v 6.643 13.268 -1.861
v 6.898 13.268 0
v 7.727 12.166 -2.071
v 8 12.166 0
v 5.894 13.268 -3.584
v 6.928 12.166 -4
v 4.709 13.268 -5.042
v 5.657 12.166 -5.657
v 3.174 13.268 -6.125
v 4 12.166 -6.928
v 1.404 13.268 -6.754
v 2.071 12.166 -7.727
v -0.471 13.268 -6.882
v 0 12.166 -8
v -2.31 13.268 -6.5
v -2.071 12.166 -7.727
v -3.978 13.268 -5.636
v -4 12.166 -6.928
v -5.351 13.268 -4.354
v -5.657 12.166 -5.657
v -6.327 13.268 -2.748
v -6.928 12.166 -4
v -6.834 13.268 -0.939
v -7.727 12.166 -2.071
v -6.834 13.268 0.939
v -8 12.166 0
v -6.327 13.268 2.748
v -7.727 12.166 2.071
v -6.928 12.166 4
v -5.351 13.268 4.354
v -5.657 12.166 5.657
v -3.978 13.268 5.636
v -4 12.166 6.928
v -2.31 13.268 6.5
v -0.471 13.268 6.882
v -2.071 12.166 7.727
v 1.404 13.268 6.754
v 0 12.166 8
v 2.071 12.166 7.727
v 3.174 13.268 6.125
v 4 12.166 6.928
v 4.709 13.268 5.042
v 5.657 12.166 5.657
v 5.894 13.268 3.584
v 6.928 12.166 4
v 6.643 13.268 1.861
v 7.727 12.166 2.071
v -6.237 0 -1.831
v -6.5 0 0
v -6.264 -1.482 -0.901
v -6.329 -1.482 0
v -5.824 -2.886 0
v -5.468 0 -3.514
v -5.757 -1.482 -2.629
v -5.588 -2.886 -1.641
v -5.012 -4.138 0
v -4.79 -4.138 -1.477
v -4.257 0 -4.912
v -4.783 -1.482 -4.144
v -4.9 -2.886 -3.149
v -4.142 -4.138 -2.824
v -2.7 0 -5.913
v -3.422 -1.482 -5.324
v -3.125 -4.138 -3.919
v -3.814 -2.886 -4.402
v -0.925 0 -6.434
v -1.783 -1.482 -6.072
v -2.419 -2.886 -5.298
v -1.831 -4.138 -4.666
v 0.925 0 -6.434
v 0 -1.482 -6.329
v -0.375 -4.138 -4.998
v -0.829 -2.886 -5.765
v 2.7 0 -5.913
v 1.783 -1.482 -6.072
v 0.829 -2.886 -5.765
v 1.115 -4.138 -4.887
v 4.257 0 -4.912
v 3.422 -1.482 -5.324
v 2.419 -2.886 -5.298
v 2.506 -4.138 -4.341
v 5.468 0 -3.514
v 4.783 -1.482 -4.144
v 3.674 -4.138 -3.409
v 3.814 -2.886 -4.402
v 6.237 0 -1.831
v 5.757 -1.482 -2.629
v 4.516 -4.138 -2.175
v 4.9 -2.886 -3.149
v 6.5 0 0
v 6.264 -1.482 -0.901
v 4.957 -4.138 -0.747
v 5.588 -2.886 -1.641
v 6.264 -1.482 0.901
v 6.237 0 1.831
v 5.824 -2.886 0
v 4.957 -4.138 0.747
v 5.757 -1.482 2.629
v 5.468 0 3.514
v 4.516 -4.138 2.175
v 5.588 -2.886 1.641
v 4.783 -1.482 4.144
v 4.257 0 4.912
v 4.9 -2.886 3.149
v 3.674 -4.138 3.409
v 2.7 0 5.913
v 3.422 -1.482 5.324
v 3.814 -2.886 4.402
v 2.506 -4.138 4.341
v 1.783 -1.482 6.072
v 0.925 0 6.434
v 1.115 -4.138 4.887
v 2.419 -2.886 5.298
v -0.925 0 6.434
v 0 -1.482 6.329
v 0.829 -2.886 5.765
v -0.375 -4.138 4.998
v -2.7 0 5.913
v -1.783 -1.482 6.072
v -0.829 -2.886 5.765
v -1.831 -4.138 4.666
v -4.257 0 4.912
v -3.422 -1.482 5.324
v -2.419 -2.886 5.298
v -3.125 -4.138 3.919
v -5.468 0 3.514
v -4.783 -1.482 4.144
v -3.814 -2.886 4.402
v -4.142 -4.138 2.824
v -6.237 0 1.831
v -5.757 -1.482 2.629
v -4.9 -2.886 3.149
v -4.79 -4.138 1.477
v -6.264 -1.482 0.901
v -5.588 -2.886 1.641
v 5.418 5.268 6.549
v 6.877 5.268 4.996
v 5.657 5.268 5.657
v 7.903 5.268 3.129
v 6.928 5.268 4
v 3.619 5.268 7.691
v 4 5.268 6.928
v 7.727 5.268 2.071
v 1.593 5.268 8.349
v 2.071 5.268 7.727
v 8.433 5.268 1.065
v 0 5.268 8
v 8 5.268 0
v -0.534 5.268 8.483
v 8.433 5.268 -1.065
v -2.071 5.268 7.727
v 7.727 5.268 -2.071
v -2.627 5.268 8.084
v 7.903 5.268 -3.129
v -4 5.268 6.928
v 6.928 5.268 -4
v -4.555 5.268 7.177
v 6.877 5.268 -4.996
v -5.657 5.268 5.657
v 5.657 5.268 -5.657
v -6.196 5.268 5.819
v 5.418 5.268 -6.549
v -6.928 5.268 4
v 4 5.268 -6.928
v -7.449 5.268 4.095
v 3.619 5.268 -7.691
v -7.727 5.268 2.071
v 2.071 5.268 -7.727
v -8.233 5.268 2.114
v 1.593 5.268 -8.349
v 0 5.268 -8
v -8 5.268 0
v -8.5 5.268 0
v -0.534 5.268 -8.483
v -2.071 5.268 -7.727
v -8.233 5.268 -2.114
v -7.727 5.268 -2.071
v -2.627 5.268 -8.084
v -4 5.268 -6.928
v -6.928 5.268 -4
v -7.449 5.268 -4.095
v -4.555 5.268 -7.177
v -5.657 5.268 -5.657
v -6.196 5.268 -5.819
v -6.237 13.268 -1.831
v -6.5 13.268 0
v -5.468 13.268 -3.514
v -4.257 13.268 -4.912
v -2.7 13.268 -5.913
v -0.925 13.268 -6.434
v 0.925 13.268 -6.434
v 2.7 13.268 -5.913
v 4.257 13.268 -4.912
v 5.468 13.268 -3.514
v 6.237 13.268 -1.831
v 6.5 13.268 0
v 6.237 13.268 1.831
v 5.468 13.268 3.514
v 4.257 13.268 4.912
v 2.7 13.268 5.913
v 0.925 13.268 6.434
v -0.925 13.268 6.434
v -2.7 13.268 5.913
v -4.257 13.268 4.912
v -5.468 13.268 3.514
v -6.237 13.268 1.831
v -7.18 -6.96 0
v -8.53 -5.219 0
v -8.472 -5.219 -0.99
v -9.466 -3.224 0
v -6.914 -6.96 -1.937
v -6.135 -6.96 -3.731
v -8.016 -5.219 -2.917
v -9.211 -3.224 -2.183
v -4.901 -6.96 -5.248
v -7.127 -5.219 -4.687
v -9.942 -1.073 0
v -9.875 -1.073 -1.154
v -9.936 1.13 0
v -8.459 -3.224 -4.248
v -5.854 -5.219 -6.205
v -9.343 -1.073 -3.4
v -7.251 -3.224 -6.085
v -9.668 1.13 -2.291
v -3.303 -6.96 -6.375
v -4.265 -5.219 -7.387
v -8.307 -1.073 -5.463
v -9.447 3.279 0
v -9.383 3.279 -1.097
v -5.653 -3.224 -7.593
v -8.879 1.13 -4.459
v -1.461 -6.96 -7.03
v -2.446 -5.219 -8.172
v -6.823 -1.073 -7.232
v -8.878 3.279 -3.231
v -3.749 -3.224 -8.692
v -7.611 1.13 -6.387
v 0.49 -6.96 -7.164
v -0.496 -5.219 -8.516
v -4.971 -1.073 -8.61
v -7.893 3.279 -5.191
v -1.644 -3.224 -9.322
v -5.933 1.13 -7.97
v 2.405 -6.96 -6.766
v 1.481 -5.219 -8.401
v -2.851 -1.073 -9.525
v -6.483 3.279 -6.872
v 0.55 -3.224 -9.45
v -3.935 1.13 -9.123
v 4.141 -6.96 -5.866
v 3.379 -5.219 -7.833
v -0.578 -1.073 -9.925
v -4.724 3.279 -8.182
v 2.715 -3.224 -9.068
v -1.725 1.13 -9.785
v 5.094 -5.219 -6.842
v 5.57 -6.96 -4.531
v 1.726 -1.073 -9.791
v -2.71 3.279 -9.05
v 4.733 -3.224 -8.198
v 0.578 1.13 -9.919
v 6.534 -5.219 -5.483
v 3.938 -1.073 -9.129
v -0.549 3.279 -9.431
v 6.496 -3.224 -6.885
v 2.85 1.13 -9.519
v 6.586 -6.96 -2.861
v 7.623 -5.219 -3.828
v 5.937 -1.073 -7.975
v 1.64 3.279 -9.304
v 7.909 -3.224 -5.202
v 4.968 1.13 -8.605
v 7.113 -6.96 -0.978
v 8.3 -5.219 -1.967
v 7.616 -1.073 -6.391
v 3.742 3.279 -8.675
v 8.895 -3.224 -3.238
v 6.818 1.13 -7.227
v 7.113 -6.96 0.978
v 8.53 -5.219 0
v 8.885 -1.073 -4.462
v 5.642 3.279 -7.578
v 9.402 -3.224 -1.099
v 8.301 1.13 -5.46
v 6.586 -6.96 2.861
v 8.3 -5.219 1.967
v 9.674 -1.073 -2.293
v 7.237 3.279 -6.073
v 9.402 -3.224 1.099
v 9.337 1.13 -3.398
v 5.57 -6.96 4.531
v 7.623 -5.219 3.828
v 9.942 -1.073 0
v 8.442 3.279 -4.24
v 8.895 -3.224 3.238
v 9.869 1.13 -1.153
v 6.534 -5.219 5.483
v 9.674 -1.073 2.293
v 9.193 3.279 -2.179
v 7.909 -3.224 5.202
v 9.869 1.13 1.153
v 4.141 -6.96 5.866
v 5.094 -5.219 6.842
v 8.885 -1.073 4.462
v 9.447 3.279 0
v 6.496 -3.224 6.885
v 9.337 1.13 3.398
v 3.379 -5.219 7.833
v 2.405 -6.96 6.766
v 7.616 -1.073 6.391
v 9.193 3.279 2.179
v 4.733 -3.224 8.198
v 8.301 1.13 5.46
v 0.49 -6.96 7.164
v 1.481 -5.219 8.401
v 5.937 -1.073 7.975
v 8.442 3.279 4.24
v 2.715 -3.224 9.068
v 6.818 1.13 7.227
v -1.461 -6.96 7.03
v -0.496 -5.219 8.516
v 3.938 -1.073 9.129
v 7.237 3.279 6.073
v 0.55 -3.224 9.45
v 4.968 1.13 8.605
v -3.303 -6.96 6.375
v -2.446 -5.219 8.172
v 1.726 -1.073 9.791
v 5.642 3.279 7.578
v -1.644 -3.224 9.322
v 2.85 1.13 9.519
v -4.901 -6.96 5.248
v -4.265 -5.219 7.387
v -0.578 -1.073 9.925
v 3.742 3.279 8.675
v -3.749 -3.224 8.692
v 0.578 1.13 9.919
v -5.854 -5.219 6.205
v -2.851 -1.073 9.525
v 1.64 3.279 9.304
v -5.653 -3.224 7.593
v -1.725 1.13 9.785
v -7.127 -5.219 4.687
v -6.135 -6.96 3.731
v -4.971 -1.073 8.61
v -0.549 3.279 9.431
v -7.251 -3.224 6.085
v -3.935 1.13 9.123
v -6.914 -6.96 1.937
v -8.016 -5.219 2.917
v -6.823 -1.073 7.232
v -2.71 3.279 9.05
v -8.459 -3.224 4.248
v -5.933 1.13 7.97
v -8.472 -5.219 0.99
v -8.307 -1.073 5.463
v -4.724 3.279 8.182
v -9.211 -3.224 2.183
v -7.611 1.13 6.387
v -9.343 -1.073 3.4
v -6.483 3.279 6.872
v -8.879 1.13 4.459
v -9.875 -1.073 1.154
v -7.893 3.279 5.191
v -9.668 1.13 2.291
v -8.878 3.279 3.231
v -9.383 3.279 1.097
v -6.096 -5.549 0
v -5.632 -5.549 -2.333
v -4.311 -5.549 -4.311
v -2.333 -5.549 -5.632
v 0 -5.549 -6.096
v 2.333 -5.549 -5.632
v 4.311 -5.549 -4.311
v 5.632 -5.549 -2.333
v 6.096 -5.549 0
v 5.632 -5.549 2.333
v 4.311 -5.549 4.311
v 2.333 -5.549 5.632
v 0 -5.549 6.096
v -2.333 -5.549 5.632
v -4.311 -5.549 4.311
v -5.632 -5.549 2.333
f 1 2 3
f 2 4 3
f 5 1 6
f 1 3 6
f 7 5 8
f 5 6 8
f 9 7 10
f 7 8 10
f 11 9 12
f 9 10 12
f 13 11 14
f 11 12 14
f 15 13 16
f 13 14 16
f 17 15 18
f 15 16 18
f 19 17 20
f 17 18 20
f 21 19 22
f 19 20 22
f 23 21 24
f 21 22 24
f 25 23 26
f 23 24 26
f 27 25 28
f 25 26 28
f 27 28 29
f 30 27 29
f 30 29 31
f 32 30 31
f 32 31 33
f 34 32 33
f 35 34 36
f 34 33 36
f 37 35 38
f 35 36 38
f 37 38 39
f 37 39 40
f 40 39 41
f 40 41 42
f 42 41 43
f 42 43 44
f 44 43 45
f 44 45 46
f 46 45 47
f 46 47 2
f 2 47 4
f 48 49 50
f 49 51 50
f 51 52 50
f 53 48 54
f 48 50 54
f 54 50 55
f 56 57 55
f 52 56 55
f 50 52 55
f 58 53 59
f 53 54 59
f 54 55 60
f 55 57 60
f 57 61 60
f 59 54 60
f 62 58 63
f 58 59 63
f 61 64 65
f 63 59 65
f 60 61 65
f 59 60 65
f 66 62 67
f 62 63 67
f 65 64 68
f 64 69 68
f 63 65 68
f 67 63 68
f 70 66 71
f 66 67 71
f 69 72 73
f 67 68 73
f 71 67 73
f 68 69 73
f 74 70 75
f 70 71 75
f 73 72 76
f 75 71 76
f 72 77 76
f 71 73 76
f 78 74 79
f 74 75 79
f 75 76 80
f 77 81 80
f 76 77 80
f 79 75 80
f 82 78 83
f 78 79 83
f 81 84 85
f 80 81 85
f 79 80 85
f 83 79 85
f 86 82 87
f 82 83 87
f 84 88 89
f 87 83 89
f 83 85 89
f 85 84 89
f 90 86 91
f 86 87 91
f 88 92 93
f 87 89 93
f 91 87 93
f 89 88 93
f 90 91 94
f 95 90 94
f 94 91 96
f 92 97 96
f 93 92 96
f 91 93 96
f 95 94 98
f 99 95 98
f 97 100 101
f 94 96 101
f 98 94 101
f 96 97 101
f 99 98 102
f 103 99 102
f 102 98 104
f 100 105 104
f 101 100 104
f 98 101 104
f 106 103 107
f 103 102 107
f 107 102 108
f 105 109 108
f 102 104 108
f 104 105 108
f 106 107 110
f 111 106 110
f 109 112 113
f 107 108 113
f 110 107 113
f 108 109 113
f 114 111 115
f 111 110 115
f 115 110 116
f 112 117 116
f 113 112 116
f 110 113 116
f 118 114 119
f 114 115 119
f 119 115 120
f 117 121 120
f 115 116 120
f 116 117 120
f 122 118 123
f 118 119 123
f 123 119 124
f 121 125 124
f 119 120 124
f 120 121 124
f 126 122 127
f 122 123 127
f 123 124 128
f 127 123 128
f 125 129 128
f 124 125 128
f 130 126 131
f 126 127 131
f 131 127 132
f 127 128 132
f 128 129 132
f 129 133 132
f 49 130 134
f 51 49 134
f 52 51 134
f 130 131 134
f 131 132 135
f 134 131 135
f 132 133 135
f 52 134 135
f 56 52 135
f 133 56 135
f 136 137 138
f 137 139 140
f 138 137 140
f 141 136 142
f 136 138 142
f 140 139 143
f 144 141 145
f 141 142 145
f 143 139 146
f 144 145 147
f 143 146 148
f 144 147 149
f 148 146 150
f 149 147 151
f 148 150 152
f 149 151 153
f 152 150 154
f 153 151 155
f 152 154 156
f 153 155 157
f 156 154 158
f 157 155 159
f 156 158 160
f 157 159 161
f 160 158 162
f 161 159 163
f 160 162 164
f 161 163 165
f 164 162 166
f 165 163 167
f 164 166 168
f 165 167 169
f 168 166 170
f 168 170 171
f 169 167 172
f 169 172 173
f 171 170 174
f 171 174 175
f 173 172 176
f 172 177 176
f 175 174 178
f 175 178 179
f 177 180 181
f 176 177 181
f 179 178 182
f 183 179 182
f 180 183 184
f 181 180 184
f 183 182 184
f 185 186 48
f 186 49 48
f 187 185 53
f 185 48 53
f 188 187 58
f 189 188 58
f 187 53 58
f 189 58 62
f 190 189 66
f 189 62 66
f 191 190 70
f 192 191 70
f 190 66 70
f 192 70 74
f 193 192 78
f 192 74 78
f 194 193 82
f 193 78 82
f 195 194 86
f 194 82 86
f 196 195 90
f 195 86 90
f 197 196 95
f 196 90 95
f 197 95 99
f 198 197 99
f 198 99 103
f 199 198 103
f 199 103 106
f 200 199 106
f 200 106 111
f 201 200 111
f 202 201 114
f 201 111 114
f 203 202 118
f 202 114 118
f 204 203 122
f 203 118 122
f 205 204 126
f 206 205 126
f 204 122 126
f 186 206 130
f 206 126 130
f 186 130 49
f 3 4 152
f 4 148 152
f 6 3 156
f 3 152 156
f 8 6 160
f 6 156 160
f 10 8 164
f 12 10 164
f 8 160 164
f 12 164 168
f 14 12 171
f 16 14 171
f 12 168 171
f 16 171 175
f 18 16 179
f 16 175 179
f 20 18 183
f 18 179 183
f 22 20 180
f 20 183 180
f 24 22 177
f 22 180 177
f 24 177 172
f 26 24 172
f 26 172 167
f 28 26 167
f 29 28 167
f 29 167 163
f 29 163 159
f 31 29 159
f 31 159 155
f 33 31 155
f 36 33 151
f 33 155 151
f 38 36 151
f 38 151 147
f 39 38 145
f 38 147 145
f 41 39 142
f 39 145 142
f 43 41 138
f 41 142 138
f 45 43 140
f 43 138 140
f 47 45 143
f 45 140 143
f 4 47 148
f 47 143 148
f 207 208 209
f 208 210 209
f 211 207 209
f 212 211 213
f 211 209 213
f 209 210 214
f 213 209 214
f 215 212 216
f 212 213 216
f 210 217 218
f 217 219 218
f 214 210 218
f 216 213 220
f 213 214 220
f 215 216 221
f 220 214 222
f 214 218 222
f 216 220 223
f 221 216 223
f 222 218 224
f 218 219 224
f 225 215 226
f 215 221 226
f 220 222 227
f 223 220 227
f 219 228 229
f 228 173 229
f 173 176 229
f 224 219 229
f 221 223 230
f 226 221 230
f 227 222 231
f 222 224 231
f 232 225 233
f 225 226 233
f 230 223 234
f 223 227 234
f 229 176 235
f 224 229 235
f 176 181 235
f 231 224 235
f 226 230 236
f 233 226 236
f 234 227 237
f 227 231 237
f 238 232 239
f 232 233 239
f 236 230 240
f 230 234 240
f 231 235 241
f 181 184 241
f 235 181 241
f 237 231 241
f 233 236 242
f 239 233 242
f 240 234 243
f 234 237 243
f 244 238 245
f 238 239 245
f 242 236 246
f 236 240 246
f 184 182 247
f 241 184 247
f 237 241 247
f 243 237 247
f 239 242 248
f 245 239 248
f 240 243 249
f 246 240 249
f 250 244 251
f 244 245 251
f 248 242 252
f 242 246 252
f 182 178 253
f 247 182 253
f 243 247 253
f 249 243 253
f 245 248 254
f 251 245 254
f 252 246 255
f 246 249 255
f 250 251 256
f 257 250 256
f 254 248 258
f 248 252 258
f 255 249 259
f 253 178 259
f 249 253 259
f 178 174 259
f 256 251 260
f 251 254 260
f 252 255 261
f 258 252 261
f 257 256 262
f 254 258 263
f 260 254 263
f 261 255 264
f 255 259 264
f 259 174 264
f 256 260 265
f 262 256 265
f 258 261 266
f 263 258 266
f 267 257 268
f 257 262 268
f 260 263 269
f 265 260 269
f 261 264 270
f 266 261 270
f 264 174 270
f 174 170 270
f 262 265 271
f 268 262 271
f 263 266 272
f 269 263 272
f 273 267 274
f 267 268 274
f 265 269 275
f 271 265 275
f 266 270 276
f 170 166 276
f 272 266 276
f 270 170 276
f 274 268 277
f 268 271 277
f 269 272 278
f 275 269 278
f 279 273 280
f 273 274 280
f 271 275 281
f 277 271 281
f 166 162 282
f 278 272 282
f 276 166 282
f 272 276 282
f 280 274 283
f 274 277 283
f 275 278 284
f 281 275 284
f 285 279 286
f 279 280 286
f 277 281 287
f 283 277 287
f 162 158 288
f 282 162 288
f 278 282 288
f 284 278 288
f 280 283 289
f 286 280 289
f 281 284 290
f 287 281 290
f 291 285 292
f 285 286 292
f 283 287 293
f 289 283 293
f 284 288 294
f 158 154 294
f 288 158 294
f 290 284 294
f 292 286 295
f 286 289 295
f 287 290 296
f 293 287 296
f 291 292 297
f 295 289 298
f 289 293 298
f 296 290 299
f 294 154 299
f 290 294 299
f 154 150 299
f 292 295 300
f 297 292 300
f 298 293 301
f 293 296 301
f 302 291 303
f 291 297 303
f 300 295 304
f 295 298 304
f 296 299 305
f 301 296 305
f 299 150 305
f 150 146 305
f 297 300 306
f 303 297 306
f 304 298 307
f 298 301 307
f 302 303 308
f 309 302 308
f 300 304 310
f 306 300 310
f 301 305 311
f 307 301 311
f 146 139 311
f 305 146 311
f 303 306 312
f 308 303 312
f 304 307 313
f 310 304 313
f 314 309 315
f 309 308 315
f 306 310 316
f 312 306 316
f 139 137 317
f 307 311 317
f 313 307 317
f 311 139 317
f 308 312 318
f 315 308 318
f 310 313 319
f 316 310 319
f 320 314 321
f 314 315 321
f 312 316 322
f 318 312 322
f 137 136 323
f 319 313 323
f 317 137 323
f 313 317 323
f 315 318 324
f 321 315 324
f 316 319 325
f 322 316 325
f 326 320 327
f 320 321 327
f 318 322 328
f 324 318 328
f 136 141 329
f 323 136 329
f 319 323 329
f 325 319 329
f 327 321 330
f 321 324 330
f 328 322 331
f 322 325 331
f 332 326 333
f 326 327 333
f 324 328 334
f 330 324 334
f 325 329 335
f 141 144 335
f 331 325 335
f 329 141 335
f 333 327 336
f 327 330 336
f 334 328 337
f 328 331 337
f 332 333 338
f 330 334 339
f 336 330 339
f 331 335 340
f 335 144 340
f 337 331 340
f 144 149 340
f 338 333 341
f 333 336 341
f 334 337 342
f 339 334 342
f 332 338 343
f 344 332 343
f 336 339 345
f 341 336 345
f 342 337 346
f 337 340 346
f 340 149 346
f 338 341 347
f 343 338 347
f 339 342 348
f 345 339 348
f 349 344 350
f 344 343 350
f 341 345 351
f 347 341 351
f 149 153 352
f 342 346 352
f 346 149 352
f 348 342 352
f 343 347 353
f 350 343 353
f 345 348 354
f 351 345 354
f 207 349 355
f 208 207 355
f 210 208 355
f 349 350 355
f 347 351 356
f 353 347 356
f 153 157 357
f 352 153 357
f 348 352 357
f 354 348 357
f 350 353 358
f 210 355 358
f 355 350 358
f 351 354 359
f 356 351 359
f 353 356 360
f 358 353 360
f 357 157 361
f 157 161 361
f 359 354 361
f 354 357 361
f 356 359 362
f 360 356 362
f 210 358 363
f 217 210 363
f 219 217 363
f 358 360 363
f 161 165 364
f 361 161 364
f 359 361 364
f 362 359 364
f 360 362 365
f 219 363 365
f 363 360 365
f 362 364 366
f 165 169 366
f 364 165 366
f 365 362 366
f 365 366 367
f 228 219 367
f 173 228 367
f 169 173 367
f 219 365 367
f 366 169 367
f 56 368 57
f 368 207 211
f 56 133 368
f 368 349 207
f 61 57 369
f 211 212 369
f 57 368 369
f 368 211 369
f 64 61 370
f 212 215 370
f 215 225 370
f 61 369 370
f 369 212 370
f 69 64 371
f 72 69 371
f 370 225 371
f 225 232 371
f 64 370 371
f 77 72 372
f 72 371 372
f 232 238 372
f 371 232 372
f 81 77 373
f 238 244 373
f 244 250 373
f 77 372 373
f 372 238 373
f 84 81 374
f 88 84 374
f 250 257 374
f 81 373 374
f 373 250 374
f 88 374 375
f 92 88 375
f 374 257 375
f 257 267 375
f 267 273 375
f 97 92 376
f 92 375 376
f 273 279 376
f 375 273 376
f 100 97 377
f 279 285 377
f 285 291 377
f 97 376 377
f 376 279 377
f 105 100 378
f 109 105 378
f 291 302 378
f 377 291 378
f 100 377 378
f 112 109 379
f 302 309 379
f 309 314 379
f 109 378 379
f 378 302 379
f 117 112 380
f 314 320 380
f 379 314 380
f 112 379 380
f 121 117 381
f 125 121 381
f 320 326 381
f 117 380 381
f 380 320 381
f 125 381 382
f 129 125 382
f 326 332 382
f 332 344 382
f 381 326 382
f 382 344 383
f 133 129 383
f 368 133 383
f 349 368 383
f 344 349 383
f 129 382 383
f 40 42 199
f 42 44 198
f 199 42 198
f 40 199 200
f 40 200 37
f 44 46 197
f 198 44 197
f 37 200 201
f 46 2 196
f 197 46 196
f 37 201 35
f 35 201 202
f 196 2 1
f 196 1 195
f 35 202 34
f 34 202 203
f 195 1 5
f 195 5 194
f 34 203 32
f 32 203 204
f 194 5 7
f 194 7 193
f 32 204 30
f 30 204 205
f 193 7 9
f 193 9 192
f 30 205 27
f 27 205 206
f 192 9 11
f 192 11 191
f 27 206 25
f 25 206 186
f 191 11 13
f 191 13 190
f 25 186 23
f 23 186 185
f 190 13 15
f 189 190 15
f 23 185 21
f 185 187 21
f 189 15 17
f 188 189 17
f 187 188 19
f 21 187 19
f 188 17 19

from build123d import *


# Read off the part's stored shape, not the designer's step: M16x2.0 Machine Threads Stud1
with BuildPart() as part:
    # Sketch1 → Revolve1 (revolve)
    with BuildSketch(Plane.XY):
        with BuildLine():
            Line((-8.5, 13.267826876), (-6.5, 13.267826876))
            Line((-6.5, 13.267826876), (-6.5, 0))
            ThreePointArc((-6.5, 0), (-6.116831152, -2.198721596), (-5.01249949, -4.138218078))
            Line((-5.01249949, -4.138218078), (-7.180291398, -6.960130418))
            ThreePointArc((-7.180291398, -6.960130418), (-9.942264304, -1.073024006), (-8.5, 5.267826876))
            Line((-8.5, 5.267826876), (-8.5, 13.267826876))
        make_face()
    revolve(axis=Axis((0, 28.261953017, 0), (0, -1, 0)))

    # M16x2.0 Machine Threads Stud1 outline → M16x2.0 Machine Threads Stud1 (revolve, cut)
    with BuildSketch(Plane.XY):
        Polygon((8.5, 13.267826876), (6.8985, 13.267826876), (8, 12.166326876), (8, 5.267826876), (8.5, 5.267826876), align=None)
    revolve(axis=Axis((0, 0, 0), (0, 1, 0)), mode=Mode.SUBTRACT)


solid = part.part
